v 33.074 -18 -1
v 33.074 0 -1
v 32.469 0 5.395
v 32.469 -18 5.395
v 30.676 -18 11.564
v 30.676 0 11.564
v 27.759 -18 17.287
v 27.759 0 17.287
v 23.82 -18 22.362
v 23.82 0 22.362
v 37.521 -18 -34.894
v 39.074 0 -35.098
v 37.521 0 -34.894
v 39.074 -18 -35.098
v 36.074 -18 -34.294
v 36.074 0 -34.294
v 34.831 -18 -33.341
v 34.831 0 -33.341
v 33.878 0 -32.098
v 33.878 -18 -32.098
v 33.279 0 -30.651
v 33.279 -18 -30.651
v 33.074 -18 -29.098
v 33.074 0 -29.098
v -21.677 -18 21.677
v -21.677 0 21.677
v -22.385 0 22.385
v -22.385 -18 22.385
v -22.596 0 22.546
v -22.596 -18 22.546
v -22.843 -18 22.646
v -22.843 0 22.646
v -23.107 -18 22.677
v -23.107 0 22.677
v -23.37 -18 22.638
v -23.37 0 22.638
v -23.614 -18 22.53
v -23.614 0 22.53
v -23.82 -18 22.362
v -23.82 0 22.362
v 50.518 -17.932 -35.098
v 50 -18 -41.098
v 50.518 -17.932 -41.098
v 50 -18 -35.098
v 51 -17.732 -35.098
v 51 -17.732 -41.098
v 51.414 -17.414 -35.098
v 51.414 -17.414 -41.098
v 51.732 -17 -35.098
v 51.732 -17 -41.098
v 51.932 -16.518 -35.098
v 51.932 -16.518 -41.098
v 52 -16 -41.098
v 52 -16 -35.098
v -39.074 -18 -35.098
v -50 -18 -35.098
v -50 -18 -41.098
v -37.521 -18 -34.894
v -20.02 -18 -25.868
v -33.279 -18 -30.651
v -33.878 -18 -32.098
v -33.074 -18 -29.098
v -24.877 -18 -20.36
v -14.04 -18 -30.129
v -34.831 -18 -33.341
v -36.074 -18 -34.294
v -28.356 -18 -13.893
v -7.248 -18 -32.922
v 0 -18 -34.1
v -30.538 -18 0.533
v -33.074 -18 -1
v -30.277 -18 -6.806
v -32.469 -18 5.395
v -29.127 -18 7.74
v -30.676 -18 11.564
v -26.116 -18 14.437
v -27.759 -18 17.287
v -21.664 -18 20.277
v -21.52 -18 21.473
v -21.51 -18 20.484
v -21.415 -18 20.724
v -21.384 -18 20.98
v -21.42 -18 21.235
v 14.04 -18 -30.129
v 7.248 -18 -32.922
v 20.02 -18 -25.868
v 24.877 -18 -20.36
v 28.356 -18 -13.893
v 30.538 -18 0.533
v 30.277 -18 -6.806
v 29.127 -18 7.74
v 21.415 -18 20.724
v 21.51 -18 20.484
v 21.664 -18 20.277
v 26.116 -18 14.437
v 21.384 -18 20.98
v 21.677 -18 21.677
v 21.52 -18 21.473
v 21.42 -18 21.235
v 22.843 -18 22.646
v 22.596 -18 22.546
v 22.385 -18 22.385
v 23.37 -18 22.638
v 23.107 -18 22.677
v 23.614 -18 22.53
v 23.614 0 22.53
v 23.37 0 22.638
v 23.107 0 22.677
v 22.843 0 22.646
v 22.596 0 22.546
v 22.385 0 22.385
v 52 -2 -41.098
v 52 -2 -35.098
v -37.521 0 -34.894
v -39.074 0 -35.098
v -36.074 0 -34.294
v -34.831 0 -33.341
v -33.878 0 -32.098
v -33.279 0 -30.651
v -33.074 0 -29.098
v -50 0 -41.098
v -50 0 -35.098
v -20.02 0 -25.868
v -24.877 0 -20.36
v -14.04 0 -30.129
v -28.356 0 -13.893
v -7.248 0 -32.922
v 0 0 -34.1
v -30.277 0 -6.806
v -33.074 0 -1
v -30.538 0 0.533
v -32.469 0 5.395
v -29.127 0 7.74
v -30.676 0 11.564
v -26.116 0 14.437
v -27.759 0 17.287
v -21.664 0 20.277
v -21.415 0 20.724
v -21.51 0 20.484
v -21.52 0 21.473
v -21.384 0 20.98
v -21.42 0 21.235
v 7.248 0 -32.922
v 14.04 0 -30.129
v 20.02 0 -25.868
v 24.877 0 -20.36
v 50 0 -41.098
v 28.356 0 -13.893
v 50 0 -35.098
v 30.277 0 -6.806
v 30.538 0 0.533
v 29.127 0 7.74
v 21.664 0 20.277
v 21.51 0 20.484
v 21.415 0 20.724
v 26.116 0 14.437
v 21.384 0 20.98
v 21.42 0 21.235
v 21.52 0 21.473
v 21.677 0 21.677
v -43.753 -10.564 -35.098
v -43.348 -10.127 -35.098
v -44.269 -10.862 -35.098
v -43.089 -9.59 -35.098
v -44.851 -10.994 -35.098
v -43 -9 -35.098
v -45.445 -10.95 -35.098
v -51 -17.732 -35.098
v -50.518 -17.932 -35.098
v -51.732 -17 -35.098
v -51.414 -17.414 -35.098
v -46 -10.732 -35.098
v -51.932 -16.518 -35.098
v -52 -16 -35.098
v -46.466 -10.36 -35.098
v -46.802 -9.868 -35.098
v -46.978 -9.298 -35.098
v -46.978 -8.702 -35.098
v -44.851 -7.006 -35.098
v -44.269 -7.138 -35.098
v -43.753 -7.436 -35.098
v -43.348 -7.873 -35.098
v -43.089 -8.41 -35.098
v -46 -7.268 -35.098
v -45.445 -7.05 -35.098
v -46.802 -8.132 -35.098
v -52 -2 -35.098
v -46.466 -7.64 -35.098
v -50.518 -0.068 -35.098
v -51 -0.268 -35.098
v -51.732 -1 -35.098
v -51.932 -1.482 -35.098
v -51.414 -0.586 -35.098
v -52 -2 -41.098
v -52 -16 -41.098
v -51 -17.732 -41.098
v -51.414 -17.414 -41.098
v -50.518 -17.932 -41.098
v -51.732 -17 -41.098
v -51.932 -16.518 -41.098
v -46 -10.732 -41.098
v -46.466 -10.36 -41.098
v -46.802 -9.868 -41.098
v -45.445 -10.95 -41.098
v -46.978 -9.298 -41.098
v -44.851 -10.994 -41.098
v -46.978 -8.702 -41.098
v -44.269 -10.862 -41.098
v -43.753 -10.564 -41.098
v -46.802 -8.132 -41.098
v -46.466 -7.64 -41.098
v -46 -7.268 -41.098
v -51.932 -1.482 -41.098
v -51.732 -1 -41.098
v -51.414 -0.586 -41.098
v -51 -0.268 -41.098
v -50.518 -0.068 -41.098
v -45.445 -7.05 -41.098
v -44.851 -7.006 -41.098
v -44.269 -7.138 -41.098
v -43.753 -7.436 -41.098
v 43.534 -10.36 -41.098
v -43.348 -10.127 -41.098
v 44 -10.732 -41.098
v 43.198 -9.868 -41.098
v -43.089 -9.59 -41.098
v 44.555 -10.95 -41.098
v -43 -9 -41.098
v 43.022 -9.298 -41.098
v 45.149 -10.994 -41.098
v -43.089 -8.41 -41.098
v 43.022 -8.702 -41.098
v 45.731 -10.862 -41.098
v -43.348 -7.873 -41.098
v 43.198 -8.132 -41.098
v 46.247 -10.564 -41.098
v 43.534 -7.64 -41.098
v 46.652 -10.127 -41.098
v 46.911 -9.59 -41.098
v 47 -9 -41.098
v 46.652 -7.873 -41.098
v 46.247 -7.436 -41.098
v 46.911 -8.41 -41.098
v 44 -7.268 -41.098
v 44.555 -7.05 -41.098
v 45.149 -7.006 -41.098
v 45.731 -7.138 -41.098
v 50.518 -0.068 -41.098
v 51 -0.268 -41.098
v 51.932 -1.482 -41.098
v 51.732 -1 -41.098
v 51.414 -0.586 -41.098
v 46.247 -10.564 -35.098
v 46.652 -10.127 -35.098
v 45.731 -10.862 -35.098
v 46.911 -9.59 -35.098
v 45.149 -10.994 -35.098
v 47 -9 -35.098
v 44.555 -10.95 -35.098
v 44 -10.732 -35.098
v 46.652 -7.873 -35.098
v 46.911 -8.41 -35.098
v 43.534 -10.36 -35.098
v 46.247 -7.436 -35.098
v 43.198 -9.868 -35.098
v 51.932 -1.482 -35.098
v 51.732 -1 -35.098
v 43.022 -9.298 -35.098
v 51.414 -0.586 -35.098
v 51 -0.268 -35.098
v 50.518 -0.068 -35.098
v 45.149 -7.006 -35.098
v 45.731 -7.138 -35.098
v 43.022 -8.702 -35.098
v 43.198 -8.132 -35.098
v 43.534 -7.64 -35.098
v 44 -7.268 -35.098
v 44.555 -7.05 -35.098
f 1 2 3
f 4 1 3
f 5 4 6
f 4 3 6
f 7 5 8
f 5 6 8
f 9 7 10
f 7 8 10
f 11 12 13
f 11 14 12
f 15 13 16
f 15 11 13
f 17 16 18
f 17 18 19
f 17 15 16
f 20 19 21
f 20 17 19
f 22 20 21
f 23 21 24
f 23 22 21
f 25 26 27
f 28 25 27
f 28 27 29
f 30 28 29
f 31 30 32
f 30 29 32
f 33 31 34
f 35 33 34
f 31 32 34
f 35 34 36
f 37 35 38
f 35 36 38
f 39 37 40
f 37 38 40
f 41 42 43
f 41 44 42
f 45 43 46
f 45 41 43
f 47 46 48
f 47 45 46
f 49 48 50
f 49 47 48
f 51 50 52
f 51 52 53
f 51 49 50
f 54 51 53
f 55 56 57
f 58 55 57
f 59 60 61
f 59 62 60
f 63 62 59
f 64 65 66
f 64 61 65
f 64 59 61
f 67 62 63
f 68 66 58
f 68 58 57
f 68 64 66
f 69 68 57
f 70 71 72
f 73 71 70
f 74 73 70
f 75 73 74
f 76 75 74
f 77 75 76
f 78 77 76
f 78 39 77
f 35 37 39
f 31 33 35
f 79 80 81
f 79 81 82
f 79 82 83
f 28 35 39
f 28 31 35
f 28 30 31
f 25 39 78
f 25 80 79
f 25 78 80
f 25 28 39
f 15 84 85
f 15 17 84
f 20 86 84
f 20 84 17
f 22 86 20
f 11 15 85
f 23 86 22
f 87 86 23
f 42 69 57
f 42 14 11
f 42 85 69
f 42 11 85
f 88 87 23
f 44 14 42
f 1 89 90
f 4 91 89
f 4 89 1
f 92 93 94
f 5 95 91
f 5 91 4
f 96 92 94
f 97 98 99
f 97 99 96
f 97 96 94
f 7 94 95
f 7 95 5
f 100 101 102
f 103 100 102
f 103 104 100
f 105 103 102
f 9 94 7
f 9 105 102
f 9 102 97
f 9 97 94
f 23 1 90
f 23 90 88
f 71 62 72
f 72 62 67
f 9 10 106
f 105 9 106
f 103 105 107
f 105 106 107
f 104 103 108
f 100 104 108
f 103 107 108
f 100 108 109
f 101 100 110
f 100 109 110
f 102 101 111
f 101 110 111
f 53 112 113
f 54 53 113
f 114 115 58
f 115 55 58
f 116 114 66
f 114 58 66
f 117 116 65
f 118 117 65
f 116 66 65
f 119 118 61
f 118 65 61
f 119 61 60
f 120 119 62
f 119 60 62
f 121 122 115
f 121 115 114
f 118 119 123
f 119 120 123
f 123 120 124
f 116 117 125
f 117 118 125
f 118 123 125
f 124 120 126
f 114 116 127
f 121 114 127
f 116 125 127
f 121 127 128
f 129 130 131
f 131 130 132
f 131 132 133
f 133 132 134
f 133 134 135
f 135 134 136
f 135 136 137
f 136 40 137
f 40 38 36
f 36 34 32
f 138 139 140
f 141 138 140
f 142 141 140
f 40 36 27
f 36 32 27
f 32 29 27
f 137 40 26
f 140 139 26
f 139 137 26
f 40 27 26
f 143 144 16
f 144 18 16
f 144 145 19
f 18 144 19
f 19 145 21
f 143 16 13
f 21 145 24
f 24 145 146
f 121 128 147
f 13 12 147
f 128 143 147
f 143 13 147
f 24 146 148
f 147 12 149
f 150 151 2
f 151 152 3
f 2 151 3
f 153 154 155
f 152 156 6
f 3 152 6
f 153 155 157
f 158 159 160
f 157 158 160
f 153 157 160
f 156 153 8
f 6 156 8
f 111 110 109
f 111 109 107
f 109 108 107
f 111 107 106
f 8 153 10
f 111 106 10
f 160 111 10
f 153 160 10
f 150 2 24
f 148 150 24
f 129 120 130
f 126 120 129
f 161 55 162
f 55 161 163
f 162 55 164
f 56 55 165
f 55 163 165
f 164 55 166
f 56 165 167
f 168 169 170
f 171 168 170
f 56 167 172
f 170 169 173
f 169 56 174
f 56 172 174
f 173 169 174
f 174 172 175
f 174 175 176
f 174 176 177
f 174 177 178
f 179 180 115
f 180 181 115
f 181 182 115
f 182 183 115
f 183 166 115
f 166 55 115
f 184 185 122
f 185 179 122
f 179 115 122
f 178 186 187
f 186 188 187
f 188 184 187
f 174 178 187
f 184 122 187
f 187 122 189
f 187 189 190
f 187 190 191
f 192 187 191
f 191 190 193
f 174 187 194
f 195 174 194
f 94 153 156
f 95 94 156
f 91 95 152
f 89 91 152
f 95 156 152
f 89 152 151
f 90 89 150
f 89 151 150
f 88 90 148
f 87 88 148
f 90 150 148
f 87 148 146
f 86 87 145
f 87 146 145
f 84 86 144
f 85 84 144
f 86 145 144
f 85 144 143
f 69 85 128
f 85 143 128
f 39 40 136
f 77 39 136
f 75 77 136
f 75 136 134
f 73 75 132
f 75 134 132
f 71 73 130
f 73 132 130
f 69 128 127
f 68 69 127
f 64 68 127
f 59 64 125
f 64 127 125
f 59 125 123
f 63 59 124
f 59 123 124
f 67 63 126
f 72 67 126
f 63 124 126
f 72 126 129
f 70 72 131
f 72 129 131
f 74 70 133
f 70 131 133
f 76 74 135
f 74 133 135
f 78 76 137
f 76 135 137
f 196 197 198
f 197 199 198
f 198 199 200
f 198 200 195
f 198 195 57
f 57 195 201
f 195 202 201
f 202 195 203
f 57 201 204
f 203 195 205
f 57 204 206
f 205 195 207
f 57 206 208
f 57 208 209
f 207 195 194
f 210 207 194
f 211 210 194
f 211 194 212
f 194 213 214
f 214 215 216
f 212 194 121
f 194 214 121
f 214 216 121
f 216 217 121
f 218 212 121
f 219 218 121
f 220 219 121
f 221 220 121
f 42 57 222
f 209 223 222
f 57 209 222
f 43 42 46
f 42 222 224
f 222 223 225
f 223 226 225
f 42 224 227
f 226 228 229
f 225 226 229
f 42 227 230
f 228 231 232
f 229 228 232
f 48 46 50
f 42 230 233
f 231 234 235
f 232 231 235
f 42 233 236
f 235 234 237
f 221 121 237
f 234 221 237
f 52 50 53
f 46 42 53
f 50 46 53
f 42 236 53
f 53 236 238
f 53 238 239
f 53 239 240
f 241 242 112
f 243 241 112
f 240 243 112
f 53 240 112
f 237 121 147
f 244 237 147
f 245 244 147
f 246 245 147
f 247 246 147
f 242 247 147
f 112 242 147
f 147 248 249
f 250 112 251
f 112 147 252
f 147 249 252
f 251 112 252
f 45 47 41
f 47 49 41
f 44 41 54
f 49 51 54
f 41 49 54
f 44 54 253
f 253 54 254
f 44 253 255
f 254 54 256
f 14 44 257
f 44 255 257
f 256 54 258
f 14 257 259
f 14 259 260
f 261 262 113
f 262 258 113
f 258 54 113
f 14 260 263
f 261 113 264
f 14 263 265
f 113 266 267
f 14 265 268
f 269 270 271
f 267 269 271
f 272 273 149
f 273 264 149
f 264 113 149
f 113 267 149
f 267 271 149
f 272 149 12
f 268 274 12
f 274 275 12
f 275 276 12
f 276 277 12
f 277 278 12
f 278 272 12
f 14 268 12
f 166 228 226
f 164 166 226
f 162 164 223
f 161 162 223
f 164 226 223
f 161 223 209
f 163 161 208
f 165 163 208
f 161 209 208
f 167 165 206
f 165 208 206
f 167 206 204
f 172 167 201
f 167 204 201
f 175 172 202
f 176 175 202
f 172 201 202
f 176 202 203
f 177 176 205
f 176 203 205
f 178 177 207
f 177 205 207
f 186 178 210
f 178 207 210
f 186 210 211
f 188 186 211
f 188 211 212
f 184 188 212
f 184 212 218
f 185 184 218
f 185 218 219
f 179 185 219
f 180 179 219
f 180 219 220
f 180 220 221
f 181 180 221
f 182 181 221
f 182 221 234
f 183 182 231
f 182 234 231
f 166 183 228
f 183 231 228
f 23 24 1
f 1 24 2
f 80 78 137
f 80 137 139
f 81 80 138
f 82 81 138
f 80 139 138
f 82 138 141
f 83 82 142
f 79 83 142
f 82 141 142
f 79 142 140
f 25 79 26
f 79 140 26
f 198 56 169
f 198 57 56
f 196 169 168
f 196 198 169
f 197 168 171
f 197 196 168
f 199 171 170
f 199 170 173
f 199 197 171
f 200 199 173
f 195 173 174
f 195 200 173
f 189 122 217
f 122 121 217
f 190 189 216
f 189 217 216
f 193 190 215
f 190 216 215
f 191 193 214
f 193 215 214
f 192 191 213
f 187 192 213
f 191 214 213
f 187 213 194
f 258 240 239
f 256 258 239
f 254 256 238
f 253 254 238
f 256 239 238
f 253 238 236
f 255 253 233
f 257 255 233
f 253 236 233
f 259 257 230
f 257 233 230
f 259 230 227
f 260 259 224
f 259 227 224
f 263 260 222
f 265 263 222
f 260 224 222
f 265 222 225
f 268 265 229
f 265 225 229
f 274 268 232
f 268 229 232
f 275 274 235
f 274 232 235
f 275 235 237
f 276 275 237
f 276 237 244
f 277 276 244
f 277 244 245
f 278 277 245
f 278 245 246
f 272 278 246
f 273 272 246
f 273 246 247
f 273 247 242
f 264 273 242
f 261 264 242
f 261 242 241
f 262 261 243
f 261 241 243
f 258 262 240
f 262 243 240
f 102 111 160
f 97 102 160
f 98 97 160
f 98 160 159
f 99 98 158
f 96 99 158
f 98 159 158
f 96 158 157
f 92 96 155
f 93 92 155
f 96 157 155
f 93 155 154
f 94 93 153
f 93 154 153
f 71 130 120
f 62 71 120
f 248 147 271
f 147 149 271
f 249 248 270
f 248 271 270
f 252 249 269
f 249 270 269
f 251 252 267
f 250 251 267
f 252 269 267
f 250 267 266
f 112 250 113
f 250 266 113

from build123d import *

# Parameters (mm, degrees)
F1_DEPTH = 18
F2_R     = 2
F3_DEPTH = 6
F4_R     = 2
F5_R     = 6


with BuildPart() as f1:
    # F0 (on Front) → F1 (new body)
    with BuildSketch(Plane.XZ):
        with BuildLine():
            ThreePointArc((21.663506, 20.276783), (28.356264, -13.893308), (0, -34.1))
            ThreePointArc((0, -34.1), (-28.356264, -13.893308), (-21.663506, 20.276783))
            ThreePointArc((-21.663506, 20.276783), (-21.384271, 20.979731), (-21.677117, 21.677117))
            Line((-21.677117, 21.677117), (-22.384578, 22.384578))
            ThreePointArc((-22.384578, 22.384578), (-23.107247, 22.67735), (-23.820455, 22.362229))
            ThreePointArc((-23.820455, 22.362229), (-30.676458, 11.564077), (-33.074125, -1))
            Line((-33.074125, -1), (-33.074125, -35.098328))
            Line((-33.074125, -35.098328), (-52, -35.098328))
            Line((-52, -35.098328), (-52, -41.098328))
            Line((-52, -41.098328), (0, -41.098328))
            Line((0, -41.098328), (52, -41.098328))
            Line((52, -41.098328), (52, -35.098328))
            Line((52, -35.098328), (33.074125, -35.098328))
            Line((33.074125, -35.098328), (33.074125, -1))
            ThreePointArc((33.074125, -1), (30.676458, 11.564077), (23.820455, 22.362229))
            ThreePointArc((23.820455, 22.362229), (23.107247, 22.67735), (22.384578, 22.384578))
            Line((22.384578, 22.384578), (21.677117, 21.677117))
            ThreePointArc((21.677117, 21.677117), (21.384271, 20.979731), (21.663506, 20.276783))
        make_face()
    extrude(amount=F1_DEPTH)

    # F2 (on face) → F3 (cut, through all)
    with BuildSketch(Plane(origin=(0, 0, -41.098328), x_dir=(1, 0, 0), z_dir=(0, 0, -1))):
        with Locations((-45, 9)):
            Circle(F2_R)
        with Locations((45, 9)):
            Circle(F2_R)
    extrude(amount=-F3_DEPTH, mode=Mode.SUBTRACT)

    # F4
    f4_edges = [f1.edges().sort_by_distance(p)[0] for p in [
        (-52, 0, -38.098328),
        (-52, -18, -38.098328),
        (52, -18, -38.098328),
        (52, 0, -38.098328),
    ]]
    fillet(f4_edges, radius=F4_R)

    # F5
    f5_edges = [f1.edges().sort_by_distance(p)[0] for p in [
        (-33.074125, -9, -35.098328),
        (33.074125, -9, -35.098328),
    ]]
    fillet(f5_edges, radius=F5_R)


solid = f1.part
